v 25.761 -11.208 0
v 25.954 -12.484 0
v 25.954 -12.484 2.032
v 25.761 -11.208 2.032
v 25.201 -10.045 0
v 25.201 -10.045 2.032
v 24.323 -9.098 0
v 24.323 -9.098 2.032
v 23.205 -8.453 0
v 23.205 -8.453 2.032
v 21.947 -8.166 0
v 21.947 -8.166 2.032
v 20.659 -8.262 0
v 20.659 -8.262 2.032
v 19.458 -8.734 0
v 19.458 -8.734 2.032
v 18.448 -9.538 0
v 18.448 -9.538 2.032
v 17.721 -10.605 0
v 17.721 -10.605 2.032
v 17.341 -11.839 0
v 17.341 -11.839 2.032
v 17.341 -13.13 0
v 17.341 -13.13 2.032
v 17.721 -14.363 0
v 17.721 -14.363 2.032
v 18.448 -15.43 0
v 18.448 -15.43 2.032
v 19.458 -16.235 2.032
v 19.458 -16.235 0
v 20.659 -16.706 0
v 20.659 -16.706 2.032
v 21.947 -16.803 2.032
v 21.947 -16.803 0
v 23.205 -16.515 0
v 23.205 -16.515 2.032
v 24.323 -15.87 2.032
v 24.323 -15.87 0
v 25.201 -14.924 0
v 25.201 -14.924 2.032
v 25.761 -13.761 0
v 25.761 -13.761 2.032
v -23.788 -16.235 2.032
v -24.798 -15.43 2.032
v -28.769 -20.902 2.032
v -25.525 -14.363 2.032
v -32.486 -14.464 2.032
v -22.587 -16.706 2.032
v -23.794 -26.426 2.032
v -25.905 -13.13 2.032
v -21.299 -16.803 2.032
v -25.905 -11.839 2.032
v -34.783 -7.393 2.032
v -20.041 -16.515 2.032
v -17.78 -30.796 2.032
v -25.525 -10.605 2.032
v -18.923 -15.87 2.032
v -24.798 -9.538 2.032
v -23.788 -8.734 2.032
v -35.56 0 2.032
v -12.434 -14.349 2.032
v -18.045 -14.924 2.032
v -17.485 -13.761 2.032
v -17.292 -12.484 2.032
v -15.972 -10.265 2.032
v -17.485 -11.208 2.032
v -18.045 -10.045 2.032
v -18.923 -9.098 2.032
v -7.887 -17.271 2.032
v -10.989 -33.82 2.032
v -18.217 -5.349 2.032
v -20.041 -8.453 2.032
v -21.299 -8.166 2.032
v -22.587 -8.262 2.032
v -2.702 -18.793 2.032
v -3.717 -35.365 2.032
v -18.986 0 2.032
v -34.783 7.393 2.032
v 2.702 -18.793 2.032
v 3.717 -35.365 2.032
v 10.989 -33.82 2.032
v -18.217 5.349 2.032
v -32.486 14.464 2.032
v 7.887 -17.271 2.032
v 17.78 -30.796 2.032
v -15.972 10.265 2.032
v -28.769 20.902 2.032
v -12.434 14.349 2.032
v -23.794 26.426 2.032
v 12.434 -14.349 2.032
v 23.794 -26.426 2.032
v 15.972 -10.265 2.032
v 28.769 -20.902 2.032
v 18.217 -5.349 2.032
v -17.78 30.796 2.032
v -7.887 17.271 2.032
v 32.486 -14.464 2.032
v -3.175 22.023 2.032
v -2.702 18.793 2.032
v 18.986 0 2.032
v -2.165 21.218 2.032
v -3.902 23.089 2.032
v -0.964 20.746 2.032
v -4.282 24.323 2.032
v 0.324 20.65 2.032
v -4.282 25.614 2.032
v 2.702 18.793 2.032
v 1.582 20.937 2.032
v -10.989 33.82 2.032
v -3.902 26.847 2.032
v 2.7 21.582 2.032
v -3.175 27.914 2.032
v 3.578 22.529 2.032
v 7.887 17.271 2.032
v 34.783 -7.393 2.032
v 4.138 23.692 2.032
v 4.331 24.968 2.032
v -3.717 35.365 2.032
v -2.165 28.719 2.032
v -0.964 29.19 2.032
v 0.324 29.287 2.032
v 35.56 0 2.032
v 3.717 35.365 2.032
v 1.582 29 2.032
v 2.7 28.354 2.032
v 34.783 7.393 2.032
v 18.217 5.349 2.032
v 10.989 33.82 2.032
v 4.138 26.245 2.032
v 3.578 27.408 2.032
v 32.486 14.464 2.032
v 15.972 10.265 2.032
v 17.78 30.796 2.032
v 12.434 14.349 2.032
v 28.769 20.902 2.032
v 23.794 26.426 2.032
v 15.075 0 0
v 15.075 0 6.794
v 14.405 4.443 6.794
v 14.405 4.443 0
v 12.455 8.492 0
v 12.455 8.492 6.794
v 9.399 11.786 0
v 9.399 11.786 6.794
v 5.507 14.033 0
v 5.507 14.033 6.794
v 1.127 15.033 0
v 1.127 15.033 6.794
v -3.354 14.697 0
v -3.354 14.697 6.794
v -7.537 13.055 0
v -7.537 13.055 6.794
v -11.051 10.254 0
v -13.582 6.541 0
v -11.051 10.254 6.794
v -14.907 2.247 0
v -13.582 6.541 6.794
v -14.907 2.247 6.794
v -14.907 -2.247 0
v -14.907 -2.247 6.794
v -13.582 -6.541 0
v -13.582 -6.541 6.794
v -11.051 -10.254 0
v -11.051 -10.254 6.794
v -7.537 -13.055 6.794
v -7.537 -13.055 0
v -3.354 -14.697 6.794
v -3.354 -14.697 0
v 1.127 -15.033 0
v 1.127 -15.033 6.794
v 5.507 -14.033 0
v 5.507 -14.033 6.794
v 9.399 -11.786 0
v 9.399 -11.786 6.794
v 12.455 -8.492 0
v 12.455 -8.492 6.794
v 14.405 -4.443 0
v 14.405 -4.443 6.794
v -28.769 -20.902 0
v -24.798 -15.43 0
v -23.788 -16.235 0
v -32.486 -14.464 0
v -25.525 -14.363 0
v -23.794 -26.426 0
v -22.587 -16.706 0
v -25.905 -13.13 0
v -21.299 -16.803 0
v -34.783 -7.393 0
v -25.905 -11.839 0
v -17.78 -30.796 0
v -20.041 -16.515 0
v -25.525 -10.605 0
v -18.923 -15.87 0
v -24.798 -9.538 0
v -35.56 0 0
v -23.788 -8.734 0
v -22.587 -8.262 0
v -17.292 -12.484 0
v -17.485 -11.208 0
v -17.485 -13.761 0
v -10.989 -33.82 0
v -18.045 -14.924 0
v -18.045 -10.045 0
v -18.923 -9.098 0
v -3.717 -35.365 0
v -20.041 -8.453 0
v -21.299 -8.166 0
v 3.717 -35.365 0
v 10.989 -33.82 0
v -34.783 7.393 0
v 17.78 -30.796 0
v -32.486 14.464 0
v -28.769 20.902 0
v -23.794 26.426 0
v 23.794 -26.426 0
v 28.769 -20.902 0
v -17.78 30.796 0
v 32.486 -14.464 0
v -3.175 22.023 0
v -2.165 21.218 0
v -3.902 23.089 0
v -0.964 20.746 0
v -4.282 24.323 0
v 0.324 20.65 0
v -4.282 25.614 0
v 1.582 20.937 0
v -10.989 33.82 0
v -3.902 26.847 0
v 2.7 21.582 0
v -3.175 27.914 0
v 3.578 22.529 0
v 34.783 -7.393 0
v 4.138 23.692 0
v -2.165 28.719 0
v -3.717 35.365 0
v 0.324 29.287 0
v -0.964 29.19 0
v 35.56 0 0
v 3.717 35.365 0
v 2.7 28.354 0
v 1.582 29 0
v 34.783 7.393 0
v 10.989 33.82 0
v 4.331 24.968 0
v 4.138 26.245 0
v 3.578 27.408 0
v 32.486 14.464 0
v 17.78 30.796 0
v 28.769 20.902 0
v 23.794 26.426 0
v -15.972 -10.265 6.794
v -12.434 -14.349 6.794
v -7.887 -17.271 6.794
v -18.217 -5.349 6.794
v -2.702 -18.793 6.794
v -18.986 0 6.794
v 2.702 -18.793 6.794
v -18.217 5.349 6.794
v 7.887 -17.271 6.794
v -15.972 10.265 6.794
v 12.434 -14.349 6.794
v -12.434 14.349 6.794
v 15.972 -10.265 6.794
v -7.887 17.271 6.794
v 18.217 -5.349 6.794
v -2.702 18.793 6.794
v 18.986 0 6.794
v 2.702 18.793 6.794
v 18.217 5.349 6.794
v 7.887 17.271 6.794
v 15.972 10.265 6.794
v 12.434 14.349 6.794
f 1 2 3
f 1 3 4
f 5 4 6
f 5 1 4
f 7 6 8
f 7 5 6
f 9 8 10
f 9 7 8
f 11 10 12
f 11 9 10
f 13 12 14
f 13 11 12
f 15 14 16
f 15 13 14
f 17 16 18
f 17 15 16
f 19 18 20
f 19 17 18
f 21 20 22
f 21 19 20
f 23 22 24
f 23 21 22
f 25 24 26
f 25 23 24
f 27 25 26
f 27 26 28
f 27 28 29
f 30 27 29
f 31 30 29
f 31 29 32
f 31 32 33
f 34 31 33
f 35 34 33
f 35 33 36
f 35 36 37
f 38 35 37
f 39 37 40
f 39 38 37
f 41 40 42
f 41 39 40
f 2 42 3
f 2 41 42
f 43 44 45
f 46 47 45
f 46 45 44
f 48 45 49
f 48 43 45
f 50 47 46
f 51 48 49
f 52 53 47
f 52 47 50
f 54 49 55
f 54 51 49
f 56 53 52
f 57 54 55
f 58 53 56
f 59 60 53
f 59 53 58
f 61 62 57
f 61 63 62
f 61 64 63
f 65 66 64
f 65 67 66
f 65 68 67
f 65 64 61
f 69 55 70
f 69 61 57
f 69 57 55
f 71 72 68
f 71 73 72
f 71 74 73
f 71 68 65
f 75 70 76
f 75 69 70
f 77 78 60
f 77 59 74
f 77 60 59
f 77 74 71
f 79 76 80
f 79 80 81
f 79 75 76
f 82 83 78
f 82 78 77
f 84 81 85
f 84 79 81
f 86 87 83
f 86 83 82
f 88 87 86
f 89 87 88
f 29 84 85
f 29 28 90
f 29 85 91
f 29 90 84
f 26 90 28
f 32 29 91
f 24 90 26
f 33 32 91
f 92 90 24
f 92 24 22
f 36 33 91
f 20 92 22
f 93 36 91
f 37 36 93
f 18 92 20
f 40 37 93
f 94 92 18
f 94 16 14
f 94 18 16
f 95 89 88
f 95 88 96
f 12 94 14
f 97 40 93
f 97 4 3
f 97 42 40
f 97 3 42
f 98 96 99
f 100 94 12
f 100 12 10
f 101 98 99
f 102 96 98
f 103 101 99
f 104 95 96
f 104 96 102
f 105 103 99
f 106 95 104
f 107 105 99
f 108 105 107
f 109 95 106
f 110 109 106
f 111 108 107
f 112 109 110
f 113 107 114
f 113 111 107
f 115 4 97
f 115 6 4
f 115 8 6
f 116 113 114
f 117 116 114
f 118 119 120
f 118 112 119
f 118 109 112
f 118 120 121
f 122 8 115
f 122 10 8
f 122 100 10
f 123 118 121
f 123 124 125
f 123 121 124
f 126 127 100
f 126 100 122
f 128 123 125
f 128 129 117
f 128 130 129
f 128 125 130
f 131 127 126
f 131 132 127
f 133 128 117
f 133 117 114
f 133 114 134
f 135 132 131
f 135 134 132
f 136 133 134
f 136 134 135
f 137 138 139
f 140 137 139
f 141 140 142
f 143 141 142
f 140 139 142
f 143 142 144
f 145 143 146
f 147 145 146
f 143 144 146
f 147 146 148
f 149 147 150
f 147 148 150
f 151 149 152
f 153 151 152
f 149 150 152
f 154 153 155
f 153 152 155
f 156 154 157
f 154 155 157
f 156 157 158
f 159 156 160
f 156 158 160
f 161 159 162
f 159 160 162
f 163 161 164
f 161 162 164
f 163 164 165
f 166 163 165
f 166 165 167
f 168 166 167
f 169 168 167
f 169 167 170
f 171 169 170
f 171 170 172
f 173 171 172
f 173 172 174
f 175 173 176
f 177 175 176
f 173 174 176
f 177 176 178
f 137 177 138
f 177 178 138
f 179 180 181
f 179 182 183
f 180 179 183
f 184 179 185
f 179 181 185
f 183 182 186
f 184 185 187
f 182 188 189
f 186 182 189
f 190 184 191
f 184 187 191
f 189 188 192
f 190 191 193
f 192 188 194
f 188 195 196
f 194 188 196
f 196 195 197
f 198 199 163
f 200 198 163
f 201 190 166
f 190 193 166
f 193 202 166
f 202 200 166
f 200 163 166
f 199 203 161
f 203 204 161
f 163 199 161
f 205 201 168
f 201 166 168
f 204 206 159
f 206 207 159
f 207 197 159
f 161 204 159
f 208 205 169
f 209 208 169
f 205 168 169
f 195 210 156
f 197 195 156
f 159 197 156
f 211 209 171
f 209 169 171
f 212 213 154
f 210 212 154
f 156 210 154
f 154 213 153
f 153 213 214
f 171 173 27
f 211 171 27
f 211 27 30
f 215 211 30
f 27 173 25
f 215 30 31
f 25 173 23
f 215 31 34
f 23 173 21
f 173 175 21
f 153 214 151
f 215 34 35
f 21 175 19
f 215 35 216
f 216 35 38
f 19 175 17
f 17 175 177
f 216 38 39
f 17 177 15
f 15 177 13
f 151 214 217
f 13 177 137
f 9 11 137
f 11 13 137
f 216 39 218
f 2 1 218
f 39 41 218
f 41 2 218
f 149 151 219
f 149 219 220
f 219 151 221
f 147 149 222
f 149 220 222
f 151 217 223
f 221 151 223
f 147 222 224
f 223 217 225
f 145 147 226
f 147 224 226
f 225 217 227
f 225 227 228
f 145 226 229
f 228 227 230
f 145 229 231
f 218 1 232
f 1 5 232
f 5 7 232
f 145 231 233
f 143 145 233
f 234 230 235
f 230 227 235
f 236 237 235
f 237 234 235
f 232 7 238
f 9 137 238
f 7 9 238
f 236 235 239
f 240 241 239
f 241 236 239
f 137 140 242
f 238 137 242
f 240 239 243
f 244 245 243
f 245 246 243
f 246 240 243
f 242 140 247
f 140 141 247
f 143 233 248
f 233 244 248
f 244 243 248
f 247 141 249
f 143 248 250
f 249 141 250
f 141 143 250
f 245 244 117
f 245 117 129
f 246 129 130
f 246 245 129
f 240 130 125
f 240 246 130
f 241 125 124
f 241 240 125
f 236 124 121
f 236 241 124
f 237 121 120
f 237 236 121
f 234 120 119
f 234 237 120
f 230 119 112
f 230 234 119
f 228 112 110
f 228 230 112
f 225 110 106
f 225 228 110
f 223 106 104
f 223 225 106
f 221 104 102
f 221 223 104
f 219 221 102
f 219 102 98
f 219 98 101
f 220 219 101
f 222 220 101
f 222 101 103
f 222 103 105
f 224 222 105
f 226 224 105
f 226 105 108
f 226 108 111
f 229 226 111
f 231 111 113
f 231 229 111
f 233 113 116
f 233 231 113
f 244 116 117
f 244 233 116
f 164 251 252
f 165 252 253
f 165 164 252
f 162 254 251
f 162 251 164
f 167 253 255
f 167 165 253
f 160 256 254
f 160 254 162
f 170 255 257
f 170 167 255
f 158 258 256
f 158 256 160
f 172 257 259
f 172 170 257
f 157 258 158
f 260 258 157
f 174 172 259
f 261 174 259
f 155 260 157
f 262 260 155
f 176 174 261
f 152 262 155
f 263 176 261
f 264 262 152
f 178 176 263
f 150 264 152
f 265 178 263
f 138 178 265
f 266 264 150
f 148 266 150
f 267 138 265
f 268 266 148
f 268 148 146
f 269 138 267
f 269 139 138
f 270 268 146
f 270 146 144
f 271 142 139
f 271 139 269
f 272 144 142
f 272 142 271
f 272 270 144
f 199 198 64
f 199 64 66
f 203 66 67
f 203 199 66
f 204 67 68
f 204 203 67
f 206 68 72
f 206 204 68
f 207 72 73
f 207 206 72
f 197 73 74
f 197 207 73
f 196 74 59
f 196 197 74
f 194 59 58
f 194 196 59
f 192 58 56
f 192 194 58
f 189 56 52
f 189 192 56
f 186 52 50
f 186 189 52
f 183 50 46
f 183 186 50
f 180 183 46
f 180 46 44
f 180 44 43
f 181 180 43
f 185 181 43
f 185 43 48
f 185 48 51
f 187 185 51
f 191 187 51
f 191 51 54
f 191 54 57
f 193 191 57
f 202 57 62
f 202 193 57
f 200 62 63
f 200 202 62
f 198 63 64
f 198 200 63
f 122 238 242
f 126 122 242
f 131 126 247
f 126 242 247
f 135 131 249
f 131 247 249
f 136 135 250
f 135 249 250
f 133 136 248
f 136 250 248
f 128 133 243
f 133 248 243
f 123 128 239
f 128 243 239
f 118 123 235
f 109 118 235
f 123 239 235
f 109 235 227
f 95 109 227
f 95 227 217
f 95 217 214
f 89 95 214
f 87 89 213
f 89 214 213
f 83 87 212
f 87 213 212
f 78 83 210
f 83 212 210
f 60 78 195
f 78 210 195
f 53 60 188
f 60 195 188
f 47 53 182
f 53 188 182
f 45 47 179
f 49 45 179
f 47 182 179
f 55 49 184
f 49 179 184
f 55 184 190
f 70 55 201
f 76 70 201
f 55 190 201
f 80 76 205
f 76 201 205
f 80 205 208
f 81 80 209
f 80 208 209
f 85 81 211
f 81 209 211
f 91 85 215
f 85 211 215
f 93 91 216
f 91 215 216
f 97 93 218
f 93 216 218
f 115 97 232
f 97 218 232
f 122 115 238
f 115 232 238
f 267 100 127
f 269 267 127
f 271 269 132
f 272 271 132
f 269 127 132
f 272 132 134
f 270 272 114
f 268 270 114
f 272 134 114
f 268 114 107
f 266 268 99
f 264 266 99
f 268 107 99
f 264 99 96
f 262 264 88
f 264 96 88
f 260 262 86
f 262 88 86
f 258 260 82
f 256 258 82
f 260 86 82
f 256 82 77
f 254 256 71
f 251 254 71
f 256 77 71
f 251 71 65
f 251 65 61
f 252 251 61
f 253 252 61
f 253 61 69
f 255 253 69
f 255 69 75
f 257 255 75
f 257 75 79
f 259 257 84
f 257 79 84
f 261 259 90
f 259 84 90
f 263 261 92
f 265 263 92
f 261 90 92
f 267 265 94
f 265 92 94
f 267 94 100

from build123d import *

# Parameters (mm, degrees)
F0_R     = 35.56
F0_R_2   = 4.3307
F1_DEPTH = 2.032
F2_R     = 18.9865
F3_DEPTH = 4.7625
F4_R     = 15.0749
F5_DEPTH = 6.7945


with BuildPart() as f1:
    # F0 (on Top) → F1 (new body)
    with BuildSketch(Plane.XY):
        Circle(F0_R)
        with Locations((-21.623095, -12.4841)):
            Circle(F0_R_2, mode=Mode.SUBTRACT)
        with Locations((21.623095, -12.4841)):
            Circle(F0_R_2, mode=Mode.SUBTRACT)
        with Locations((0, 24.9682)):
            Circle(F0_R_2, mode=Mode.SUBTRACT)
    extrude(amount=F1_DEPTH)

    # F2 (on face) → F3 (join)
    with BuildSketch(Plane.XY.offset(2.032)):
        Circle(F2_R)
    extrude(amount=F3_DEPTH)

    # F4 (on face) → F5 (cut, through all)
    with BuildSketch(Plane.XY.offset(6.7945)):
        Circle(F4_R)
    extrude(amount=-F5_DEPTH, mode=Mode.SUBTRACT)


solid = f1.part
